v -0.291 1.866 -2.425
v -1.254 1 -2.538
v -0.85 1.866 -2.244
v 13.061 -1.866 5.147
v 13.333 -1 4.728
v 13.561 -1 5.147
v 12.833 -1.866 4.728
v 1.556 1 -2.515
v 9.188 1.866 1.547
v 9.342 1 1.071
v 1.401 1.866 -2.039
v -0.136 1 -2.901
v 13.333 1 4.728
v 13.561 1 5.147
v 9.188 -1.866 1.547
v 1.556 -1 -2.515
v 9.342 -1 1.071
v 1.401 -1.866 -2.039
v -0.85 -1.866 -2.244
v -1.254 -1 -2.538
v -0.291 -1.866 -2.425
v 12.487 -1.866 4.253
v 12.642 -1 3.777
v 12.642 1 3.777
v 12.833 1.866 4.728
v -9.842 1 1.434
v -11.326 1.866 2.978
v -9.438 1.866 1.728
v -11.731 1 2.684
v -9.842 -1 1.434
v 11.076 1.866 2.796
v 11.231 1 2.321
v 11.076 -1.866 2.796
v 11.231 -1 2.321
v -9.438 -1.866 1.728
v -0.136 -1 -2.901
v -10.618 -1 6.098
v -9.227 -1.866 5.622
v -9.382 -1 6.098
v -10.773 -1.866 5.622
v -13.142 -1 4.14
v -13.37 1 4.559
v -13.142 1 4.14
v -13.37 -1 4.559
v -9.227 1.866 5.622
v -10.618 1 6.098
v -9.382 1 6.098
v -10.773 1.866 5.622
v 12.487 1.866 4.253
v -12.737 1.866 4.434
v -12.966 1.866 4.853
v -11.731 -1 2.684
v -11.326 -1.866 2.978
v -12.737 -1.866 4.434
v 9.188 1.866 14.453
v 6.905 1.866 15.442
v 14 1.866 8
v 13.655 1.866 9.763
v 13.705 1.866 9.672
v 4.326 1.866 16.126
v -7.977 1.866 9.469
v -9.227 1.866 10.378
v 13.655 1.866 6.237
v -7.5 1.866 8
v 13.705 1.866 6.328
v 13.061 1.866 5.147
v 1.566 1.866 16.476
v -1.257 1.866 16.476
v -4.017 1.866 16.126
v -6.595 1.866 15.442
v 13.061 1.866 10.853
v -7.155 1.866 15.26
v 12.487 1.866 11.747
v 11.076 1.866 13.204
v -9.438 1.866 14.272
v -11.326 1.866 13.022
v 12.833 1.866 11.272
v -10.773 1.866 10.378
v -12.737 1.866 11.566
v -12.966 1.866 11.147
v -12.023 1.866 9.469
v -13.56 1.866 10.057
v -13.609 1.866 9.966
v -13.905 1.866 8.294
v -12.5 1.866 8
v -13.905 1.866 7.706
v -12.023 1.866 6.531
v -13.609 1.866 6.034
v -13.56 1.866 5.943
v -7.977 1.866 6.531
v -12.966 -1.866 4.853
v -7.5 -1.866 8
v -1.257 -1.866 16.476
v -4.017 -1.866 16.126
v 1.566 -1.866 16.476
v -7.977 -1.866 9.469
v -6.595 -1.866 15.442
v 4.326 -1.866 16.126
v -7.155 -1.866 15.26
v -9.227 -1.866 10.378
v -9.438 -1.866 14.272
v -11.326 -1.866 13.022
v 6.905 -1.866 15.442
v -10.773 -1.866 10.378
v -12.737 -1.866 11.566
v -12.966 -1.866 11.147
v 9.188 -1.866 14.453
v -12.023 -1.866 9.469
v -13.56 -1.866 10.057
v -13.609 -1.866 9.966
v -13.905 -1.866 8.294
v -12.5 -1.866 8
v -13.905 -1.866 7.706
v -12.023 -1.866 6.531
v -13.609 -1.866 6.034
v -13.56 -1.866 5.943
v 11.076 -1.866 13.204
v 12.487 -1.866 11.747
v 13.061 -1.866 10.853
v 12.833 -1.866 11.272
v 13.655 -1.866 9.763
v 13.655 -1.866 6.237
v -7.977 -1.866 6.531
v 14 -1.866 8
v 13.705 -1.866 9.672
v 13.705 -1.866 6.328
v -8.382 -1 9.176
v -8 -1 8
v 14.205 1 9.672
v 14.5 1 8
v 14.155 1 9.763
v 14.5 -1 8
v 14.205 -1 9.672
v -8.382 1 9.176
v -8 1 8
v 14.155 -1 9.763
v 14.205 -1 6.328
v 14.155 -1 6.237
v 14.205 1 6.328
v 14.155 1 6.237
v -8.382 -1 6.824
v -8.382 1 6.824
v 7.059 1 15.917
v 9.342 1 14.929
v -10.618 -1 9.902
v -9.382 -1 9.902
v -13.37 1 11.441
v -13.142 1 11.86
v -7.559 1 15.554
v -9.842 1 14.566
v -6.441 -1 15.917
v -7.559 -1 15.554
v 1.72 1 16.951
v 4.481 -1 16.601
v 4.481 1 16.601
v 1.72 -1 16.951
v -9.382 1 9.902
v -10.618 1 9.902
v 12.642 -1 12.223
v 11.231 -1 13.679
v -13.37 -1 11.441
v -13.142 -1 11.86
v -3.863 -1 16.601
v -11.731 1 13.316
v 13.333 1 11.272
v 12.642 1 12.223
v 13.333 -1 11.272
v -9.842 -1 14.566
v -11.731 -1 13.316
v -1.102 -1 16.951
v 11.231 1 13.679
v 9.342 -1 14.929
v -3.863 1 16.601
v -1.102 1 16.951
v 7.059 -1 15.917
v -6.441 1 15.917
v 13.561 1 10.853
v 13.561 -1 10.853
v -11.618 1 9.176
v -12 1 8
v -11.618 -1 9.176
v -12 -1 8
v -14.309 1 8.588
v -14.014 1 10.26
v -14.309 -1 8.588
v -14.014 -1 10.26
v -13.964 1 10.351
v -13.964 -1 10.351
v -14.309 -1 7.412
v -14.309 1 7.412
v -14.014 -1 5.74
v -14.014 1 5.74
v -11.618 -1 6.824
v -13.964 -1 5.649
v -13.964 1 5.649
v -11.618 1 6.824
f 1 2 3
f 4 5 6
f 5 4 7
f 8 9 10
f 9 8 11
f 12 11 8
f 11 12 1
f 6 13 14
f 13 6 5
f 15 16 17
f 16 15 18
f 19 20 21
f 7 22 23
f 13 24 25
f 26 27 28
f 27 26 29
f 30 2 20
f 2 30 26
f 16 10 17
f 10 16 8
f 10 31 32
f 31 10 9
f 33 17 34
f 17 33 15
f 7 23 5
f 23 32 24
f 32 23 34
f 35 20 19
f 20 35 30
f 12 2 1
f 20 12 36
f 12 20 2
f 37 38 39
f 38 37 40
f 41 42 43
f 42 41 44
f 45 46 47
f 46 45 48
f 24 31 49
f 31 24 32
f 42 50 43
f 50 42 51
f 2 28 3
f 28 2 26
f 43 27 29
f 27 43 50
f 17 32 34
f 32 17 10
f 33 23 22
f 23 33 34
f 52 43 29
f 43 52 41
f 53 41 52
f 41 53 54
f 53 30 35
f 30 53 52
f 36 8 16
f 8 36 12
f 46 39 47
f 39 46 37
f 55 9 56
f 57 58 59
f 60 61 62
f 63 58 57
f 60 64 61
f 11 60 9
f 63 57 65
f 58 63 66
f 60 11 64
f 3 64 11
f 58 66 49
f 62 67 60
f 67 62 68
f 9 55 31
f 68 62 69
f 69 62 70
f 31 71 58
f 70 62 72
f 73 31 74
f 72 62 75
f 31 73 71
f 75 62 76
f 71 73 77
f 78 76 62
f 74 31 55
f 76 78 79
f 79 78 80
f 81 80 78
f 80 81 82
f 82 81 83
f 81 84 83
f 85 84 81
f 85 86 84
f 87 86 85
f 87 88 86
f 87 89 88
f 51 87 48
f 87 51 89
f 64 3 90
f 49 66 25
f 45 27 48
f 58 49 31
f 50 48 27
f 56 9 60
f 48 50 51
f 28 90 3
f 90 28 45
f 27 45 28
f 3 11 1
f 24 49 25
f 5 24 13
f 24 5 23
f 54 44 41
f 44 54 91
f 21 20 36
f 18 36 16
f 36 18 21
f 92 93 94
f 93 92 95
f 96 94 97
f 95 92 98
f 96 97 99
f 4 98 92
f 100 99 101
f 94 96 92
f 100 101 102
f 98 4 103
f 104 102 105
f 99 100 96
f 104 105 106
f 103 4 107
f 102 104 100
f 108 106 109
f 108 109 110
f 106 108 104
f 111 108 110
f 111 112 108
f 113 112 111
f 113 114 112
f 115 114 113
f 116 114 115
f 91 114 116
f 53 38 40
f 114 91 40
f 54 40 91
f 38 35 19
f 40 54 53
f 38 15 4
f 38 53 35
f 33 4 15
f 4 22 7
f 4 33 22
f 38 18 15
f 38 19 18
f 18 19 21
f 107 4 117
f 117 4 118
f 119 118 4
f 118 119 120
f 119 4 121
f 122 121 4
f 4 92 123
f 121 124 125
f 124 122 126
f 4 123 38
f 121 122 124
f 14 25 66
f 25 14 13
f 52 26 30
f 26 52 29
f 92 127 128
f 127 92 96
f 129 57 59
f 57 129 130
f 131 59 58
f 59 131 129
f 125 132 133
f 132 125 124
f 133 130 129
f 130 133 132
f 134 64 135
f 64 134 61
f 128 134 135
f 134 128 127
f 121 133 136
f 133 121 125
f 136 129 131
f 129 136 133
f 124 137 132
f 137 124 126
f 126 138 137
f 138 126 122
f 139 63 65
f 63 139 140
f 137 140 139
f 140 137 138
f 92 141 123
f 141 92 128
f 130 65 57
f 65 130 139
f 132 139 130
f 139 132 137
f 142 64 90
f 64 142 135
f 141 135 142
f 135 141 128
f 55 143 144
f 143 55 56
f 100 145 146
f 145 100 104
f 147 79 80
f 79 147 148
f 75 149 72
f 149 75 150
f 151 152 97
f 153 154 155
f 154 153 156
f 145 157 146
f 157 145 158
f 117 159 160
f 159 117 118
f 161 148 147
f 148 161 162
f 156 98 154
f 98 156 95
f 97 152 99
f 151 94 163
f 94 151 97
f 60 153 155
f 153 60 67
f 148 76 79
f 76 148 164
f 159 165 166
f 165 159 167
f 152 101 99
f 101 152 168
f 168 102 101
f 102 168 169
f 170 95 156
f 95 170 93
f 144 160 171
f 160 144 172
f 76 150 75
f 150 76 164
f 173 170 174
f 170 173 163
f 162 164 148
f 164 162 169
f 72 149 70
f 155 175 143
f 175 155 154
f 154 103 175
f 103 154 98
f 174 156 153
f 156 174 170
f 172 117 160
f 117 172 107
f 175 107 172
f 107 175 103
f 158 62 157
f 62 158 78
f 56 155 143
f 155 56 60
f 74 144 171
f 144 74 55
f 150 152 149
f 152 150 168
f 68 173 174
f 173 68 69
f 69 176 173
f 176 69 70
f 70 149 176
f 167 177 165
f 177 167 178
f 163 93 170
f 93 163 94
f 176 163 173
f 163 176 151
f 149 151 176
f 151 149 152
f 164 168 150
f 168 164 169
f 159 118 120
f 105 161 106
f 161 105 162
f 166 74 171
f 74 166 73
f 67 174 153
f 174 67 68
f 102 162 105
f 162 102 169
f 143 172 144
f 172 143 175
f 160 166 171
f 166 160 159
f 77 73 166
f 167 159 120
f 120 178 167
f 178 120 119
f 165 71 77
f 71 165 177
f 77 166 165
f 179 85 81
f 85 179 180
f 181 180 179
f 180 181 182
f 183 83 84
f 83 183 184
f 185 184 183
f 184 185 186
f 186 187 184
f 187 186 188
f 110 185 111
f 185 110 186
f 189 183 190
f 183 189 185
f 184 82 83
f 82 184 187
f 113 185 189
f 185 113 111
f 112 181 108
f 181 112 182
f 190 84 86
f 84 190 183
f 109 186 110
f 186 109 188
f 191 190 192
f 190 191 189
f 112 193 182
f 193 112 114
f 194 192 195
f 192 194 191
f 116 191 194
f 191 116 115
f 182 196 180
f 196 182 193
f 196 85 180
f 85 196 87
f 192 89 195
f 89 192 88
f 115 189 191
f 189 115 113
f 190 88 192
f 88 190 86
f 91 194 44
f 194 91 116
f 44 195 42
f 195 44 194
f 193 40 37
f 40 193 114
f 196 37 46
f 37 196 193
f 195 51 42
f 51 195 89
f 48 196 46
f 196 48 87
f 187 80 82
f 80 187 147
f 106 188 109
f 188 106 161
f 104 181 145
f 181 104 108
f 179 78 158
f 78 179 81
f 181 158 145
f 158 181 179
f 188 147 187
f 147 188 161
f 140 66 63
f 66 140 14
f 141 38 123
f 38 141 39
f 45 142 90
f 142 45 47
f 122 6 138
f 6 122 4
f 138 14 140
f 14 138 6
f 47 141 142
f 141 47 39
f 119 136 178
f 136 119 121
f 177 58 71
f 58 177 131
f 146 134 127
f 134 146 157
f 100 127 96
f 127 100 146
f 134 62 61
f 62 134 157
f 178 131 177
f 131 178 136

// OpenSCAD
/*
Keys for containers for: wipes, toilet paper, absorbent paper, soap, etc.
*/

/*
project: https://github.com/undercustodian/box-service-keys
author: https://github.com/undercustodian
license: This work adheres to the general license of the project to
which it belongs which is Commons Attribution 4.0 International.
https://github.com/undercustodian/box-service-keys/blob/main/LICENSE

This work is licensed under the Creative Commons Attribution 4.0 International License.
To view a copy of this license, visit http://creativecommons.org/licenses/by/4.0/ or
send a letter to Creative Commons, PO Box 1866, Mountain View, CA 94042, USA.
*/


/* [Hidden] */
//$fa = 1;
//$fs = 0.4;


/* [Basic] */

// Zoom in on the handle
zoom = 1; // [0:0.01:10]

/* [Bevel the Handle] */
// bevel radius
br = 1; // [0:0.01:10]


/* [Handle] */

//thickness of the cylinder
ht = 2; // [0:0.1:50]
// handle width
hw = 27; // [0:0.1:100]
// handle length
hl = 16; // [0:0.1:100]
// height of the handle
hh = 8; // [0:0.1:100]


/* [hole in the handle] */

// hole radius
hhr = 3; // [0:0.1:30]
// thickness around the hole
hhat = 0; // [0:0.01:10]
// transverse displacement of the hole
hhx = -10; // [-100:0.1:100]
// vertical displacement of the hole
hhz = 8; // [0:0.1:100]


/* [neck] */
// neck radius
nr = 2 ; // [0:0.01:10]
// height of the neck
nh = 0; // [0:0.1:50]



module handle(){
    rotate([90,0,0]) minkowski(){
        difference(){
            hull(){
                scale([zoom,zoom,1]){
                    translate([0,hh,0]) resize([hw,hl,ht])
                    cylinder(h=ht, r=200, center=true);
                    translate([hhx,hhz,0]) cylinder(h=ht, r=hhr+hhat, center=true);
                }
                scale([zoom,1,1]) cylinder(h=ht,r=nr, center=true);
            }
            scale([zoom,zoom,1])translate([hhx,hhz,0])
            cylinder(h=2*ht, r=hhr, center=true);
        }
        sphere(r=zoom*br);
    }
}

handle();
